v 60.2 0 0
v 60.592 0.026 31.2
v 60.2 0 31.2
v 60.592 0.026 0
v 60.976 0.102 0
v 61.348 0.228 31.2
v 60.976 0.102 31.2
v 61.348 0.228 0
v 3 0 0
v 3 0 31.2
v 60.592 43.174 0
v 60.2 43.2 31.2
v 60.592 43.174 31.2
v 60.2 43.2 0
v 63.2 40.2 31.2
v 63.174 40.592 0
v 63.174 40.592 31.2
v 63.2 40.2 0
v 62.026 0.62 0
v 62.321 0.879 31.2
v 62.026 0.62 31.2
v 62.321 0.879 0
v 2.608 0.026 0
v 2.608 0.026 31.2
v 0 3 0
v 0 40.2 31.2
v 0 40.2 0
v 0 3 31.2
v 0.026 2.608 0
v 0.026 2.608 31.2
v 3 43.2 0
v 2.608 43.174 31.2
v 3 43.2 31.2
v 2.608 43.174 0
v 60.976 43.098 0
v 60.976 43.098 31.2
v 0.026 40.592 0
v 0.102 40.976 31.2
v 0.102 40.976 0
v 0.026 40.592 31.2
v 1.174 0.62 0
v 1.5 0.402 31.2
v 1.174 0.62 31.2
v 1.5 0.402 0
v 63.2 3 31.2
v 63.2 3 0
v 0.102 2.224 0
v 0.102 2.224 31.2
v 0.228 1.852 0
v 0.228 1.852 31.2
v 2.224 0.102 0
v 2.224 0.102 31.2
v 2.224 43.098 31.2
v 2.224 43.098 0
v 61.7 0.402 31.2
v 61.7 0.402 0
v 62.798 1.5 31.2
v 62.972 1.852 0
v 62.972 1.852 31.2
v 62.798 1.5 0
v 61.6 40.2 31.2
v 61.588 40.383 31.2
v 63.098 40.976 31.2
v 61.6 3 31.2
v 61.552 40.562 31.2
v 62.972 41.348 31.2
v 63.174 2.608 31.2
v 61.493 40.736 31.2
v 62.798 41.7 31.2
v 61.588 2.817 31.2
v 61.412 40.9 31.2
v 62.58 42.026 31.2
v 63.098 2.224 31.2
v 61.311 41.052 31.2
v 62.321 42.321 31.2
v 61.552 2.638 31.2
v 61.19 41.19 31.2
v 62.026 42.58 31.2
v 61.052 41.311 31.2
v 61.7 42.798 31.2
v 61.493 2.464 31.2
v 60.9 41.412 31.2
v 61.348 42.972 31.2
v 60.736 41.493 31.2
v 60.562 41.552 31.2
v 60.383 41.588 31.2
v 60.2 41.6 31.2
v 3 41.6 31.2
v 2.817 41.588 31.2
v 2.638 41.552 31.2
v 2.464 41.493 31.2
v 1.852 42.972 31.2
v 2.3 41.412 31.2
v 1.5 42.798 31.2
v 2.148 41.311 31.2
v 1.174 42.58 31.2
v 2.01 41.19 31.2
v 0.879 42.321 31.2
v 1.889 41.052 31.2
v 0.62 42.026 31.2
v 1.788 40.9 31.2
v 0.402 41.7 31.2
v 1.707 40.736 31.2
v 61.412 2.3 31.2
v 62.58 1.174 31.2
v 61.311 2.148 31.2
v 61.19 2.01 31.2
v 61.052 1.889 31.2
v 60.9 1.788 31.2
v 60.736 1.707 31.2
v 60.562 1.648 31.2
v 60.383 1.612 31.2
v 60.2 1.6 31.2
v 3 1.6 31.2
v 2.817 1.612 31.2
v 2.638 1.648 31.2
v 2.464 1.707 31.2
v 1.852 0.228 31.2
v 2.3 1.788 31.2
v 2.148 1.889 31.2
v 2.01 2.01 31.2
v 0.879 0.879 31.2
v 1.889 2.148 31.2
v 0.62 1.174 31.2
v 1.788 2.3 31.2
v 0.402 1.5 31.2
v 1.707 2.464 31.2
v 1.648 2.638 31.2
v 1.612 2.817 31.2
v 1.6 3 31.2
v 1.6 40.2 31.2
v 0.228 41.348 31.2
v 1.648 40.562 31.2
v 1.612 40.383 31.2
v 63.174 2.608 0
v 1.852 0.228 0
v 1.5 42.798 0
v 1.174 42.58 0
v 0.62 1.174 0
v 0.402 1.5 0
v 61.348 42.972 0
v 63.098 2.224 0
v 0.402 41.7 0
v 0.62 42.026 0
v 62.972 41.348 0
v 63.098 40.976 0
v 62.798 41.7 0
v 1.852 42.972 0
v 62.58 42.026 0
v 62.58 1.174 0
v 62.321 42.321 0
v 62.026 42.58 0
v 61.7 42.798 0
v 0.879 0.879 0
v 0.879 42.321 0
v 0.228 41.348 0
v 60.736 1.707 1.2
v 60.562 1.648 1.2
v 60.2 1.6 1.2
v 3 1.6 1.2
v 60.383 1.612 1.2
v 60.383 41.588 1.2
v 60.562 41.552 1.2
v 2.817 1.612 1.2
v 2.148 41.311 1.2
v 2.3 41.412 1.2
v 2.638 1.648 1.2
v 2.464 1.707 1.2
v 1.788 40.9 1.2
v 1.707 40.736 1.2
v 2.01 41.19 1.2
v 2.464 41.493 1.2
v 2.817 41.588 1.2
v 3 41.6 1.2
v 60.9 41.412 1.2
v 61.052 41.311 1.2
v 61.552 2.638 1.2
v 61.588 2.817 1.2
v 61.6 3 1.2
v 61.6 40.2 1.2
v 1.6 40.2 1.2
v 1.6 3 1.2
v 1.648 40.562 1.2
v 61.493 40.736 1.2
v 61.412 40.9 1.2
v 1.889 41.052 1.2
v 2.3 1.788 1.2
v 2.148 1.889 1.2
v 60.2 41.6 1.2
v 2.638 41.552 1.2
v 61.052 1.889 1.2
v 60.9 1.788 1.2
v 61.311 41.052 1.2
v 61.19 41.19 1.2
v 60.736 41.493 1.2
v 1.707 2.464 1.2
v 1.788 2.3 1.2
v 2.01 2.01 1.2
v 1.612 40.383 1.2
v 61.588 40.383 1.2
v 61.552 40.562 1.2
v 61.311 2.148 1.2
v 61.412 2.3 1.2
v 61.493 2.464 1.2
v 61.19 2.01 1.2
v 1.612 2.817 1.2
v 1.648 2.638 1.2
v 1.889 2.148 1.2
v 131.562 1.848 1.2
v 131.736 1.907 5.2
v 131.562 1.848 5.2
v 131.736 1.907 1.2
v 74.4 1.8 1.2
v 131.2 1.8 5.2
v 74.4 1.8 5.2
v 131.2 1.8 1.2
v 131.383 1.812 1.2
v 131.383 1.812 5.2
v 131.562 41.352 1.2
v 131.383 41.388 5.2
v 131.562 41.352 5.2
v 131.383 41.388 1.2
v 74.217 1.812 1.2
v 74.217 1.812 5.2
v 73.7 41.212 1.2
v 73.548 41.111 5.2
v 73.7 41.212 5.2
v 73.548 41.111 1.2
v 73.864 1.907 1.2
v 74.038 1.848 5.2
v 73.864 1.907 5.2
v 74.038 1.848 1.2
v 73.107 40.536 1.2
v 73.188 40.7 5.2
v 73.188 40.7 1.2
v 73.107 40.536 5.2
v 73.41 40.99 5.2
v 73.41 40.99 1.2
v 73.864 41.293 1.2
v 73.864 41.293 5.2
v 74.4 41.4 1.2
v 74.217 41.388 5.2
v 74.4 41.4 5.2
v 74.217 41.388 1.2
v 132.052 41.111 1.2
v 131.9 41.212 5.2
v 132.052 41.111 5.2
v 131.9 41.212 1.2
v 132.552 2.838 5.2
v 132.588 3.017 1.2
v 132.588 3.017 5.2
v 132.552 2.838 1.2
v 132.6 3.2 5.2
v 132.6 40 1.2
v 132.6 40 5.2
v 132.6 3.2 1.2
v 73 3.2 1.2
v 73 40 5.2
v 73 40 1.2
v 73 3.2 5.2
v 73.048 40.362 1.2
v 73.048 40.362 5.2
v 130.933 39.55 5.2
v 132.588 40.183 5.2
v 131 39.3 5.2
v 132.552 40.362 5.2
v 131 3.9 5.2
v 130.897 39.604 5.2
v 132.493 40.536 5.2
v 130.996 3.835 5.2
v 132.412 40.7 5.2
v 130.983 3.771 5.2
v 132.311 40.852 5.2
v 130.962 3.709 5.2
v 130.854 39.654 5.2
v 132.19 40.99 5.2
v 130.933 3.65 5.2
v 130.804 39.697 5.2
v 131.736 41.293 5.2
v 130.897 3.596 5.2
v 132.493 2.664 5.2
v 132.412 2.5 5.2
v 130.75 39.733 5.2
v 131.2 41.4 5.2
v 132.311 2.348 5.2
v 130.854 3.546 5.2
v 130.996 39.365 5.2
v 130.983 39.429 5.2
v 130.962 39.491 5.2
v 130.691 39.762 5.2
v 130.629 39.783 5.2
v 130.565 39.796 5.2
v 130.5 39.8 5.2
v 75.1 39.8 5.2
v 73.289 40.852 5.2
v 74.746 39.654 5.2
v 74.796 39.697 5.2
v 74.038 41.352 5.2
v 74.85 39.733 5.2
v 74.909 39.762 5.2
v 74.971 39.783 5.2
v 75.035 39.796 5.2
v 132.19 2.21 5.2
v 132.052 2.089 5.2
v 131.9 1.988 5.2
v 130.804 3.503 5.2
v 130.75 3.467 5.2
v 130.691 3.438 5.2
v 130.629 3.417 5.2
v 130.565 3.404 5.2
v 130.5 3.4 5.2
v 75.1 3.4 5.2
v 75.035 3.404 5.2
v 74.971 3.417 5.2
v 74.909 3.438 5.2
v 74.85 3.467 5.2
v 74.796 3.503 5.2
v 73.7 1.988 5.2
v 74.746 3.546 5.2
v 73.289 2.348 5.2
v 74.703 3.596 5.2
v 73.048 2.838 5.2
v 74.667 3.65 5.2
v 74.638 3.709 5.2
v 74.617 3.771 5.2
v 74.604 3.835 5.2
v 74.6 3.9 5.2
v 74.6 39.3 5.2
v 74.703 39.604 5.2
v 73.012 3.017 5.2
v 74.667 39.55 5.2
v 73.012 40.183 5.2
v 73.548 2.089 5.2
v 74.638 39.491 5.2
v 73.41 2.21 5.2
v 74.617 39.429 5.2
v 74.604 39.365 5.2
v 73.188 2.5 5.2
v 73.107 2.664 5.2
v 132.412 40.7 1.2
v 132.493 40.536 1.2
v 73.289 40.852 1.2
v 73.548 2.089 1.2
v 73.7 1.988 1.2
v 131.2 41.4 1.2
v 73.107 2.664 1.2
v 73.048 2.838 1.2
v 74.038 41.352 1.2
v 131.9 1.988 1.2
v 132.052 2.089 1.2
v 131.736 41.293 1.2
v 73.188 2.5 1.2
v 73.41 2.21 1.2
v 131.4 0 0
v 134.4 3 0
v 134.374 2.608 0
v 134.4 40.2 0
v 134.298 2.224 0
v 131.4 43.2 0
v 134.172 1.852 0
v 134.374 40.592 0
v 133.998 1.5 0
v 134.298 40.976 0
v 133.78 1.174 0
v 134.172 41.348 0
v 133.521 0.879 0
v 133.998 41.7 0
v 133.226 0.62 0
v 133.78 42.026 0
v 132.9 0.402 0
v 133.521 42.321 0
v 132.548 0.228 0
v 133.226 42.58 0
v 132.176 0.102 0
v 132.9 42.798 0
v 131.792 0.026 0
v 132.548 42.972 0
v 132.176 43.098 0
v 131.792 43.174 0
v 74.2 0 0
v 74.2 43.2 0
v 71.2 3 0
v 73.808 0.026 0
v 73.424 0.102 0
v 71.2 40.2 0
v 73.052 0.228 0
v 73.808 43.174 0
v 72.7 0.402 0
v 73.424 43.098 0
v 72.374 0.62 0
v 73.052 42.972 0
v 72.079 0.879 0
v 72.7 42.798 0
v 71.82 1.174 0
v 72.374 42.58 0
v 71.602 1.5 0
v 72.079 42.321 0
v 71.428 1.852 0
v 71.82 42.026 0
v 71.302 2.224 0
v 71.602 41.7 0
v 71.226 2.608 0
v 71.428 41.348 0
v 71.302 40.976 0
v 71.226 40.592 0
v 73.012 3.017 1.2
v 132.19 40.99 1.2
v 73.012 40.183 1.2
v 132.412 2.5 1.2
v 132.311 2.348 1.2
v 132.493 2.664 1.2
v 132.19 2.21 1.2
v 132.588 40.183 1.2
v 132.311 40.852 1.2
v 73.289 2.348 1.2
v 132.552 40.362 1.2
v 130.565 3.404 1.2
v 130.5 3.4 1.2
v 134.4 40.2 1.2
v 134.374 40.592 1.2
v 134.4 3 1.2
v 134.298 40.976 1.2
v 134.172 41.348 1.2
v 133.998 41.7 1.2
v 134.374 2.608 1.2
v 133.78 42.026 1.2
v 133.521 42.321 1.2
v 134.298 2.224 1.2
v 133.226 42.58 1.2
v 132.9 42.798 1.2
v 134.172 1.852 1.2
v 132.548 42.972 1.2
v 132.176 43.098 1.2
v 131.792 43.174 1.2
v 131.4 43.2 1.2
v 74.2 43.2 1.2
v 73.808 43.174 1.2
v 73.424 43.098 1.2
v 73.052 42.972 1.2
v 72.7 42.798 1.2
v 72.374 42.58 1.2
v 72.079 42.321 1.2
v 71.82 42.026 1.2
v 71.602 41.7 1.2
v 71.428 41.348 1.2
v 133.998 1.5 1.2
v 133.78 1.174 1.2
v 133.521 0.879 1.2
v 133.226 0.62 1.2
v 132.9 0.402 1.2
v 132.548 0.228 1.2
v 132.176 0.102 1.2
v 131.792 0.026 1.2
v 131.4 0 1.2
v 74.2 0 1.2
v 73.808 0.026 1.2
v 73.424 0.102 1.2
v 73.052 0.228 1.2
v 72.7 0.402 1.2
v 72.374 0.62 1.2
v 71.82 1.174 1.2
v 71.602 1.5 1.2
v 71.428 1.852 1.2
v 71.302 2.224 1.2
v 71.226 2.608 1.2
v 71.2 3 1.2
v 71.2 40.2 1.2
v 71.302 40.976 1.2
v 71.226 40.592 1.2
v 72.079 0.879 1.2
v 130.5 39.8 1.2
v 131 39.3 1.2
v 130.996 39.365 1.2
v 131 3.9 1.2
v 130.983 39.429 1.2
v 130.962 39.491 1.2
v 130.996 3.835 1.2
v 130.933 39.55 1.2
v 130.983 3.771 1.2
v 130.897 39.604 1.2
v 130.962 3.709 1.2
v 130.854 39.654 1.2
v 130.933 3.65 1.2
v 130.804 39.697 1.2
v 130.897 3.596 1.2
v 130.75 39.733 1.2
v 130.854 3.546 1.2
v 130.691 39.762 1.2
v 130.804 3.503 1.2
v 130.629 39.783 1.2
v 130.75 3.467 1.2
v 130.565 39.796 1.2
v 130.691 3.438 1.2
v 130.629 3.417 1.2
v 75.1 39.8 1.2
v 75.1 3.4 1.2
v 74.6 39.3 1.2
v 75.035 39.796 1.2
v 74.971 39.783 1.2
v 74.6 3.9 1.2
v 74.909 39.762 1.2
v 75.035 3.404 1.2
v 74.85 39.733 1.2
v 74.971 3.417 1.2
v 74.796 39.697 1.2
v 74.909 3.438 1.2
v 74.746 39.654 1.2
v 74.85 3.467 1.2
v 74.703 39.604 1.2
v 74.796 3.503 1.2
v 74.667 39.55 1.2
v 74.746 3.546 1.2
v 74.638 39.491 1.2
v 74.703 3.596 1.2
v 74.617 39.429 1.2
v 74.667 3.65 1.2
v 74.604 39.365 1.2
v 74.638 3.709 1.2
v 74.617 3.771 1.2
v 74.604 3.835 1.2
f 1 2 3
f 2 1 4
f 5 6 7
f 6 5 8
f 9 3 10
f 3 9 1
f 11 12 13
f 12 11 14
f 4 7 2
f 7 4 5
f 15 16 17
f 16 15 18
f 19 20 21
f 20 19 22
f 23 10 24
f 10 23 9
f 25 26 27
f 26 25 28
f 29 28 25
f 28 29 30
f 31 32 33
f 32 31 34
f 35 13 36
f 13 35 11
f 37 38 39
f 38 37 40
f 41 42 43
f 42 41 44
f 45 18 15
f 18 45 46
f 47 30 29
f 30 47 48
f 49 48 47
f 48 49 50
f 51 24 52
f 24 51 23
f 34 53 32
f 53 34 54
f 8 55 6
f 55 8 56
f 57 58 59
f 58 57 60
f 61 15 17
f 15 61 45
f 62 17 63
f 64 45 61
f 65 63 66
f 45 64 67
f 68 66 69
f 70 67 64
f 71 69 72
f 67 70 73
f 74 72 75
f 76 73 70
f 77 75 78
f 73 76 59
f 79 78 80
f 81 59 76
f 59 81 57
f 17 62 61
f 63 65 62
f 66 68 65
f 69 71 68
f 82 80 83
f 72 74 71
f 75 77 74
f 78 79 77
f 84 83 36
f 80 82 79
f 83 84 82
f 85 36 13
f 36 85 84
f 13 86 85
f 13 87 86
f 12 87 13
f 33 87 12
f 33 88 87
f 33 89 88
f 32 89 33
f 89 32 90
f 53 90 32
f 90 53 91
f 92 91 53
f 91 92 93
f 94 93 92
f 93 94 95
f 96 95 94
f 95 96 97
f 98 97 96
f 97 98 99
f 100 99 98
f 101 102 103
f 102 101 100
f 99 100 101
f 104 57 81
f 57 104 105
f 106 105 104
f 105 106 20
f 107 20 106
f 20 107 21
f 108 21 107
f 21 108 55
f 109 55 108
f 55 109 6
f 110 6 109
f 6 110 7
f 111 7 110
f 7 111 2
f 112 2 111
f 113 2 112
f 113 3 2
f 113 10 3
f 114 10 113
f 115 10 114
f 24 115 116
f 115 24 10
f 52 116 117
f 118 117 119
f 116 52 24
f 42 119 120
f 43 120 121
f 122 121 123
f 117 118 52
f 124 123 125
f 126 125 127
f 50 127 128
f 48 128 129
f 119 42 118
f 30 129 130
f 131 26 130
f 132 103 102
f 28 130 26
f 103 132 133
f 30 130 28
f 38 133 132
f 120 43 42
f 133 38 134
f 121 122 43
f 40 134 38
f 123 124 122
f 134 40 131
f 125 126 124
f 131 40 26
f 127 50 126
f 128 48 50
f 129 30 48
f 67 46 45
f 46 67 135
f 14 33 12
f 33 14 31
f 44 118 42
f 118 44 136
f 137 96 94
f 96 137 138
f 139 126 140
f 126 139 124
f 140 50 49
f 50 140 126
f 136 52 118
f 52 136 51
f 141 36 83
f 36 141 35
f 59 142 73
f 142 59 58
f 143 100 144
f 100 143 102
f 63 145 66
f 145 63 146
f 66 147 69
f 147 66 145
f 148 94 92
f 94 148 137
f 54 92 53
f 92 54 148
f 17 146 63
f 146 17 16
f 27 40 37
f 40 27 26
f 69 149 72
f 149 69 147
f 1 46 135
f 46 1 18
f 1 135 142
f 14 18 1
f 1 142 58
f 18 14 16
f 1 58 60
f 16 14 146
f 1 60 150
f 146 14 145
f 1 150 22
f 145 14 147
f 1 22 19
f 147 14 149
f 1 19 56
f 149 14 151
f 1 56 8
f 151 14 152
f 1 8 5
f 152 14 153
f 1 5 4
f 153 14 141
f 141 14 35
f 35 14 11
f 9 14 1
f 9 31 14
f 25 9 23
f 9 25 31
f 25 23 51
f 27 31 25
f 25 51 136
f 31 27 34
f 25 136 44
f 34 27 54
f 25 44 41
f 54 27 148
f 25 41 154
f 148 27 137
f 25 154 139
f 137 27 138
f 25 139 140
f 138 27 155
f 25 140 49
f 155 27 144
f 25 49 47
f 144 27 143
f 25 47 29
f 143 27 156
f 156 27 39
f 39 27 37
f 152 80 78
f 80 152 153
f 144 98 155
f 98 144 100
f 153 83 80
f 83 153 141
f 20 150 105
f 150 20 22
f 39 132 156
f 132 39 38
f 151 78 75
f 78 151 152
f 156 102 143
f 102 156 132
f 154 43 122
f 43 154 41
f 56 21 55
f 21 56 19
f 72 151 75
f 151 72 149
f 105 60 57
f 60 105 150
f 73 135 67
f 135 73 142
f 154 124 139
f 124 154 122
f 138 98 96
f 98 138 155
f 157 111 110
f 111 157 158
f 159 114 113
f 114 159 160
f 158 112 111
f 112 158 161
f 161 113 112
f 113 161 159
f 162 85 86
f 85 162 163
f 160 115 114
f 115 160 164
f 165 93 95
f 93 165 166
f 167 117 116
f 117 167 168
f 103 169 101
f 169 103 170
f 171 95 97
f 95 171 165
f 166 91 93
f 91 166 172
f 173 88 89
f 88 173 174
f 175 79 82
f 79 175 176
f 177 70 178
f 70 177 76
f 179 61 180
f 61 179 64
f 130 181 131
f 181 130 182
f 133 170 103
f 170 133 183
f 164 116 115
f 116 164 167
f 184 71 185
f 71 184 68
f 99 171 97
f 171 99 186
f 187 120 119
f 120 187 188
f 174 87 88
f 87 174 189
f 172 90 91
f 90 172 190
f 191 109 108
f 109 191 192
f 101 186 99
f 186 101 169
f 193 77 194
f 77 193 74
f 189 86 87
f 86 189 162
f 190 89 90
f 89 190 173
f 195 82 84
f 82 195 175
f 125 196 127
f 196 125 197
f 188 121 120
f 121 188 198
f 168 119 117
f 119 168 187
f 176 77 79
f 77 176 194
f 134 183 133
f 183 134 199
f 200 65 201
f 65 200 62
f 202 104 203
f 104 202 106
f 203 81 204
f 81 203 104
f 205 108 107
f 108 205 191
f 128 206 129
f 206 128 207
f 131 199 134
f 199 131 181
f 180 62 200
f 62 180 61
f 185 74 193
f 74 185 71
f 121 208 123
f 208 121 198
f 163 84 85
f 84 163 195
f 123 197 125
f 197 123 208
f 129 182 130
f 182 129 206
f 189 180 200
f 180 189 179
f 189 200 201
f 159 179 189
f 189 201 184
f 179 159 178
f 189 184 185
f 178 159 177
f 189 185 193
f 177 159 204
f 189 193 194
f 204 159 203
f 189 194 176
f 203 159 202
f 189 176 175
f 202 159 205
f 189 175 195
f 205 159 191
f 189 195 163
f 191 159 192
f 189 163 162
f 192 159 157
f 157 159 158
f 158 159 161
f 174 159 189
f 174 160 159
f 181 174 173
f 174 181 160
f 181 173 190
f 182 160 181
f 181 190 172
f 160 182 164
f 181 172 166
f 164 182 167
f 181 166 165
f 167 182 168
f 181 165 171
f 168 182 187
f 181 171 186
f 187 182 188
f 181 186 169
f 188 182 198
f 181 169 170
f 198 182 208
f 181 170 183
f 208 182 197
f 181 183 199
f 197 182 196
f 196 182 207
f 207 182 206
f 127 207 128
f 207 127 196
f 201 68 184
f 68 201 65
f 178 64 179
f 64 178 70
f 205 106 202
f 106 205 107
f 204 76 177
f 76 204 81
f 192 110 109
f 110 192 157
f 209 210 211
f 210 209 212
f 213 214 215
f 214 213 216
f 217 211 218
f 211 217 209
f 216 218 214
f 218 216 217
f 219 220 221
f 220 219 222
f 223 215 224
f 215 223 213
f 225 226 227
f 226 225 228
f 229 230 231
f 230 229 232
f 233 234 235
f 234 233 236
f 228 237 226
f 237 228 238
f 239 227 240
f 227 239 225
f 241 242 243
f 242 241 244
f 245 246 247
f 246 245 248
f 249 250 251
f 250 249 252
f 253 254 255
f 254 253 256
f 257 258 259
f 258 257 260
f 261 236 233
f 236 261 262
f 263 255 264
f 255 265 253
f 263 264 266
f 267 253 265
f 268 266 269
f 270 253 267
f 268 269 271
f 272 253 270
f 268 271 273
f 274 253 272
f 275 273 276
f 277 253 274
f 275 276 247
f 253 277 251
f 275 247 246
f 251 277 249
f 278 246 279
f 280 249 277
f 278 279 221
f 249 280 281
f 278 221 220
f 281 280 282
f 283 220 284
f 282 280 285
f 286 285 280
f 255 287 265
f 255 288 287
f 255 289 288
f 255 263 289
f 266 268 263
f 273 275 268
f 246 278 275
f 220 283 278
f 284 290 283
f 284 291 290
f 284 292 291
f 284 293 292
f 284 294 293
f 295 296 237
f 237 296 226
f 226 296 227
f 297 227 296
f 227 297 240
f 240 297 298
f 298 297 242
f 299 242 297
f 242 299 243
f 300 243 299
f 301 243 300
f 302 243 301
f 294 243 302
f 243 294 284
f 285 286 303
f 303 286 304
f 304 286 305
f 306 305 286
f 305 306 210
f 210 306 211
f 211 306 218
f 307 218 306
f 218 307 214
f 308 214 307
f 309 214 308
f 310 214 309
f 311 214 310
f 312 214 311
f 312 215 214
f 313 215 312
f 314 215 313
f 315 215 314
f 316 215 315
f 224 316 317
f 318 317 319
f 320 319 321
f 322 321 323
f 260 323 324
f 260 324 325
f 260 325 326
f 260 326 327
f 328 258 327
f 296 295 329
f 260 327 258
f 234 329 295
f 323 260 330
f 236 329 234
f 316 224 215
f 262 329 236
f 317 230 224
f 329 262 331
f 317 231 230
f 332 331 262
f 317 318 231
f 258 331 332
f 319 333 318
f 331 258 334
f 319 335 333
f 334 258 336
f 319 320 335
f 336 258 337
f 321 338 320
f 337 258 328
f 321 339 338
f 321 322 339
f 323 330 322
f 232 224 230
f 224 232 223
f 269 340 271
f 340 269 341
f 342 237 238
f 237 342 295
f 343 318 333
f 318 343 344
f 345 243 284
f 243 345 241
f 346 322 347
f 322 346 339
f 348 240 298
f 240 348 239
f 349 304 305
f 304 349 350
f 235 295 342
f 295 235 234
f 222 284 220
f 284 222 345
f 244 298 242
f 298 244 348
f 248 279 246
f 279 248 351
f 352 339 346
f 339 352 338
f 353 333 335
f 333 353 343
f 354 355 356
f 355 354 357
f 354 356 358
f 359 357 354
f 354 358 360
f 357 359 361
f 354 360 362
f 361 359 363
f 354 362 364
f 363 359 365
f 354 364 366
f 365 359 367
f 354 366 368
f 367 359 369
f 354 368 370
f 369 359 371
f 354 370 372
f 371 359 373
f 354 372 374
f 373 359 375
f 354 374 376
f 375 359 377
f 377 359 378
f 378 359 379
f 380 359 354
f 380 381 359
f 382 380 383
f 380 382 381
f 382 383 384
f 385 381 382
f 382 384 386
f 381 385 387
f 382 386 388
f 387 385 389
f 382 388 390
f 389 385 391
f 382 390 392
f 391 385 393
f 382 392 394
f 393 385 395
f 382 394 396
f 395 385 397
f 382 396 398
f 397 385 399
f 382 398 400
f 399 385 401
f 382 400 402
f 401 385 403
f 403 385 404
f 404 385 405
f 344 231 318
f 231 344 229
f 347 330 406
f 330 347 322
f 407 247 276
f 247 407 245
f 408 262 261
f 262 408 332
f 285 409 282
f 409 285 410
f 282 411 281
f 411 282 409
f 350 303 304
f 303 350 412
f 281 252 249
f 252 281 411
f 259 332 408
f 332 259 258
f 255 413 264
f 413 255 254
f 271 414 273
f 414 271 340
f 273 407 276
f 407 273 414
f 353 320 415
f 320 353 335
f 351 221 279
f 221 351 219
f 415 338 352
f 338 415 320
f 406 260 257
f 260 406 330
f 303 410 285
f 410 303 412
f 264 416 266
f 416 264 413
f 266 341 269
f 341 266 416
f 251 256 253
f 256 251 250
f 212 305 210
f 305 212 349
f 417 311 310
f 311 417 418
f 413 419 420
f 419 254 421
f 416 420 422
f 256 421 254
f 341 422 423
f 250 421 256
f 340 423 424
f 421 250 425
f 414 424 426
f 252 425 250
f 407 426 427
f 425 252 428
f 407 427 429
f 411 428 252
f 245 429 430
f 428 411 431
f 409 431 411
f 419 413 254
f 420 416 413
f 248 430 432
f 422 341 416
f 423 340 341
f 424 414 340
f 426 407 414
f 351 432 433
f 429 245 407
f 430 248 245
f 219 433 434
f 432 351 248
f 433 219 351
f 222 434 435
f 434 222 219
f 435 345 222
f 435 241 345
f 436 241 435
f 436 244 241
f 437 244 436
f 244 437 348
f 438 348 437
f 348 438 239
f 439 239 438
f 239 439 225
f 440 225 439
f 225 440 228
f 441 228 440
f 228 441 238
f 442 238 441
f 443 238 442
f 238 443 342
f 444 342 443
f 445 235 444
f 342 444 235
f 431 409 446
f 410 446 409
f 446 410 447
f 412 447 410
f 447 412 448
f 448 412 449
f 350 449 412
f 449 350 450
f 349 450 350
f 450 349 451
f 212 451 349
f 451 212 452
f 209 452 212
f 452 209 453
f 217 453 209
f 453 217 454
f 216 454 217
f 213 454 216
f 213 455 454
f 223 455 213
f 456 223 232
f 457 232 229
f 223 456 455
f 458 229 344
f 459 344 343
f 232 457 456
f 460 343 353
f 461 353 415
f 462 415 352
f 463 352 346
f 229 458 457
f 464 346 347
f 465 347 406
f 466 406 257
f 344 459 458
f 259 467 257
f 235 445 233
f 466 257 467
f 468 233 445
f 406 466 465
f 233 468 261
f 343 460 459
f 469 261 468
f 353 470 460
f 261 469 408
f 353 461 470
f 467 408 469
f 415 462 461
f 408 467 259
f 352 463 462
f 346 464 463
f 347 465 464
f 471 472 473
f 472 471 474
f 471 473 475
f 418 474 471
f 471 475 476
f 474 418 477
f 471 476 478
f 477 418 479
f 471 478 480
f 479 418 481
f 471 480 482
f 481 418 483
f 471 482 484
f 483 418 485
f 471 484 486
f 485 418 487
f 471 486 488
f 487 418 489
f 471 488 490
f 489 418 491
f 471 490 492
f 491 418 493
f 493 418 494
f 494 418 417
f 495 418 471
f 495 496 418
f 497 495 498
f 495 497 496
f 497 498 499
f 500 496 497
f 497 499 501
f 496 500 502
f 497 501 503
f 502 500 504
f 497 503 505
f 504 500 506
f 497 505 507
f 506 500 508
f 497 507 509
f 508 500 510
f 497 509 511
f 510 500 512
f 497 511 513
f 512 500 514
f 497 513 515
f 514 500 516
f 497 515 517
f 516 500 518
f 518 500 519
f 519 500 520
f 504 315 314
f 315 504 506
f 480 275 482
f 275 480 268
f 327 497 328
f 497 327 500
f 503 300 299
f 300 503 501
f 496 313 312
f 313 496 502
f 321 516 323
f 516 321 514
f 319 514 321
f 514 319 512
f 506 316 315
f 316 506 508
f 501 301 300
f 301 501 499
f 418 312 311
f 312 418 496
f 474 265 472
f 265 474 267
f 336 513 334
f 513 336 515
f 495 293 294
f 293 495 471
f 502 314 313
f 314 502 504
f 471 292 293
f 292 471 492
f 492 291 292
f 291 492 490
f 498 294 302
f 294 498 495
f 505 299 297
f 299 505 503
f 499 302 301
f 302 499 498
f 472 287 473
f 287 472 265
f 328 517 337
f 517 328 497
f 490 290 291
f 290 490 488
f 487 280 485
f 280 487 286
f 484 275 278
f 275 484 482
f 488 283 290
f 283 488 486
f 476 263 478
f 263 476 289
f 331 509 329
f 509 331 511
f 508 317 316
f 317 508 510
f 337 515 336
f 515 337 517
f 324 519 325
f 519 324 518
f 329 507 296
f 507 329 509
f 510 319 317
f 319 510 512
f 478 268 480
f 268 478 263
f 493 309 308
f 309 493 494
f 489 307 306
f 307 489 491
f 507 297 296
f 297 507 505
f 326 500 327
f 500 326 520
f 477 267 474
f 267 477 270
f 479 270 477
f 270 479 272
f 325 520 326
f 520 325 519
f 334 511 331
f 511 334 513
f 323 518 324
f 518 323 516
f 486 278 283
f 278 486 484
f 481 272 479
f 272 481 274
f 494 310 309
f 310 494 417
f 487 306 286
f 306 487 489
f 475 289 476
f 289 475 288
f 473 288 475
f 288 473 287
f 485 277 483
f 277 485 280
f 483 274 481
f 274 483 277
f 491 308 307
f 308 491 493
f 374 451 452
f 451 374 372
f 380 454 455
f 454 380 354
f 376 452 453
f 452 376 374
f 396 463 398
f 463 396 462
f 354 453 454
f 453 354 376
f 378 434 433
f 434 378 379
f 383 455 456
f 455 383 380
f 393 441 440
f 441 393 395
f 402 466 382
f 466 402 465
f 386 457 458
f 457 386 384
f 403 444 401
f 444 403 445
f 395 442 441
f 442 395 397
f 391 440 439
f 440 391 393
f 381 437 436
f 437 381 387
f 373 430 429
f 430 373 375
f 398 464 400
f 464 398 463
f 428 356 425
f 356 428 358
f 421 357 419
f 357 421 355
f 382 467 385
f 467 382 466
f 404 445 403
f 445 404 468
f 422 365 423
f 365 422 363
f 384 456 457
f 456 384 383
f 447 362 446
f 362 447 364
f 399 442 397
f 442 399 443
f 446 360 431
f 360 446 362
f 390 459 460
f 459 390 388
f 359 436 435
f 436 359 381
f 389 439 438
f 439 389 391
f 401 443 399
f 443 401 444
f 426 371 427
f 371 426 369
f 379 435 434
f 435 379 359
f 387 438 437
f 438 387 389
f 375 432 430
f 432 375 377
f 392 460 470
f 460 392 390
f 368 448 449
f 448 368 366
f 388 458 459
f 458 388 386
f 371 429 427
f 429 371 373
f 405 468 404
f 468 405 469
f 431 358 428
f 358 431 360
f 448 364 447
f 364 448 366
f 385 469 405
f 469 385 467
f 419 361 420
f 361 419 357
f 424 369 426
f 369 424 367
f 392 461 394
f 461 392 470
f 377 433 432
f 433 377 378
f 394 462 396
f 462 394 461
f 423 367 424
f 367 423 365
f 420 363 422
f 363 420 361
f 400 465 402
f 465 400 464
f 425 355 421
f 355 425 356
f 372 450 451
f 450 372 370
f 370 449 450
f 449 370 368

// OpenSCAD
// Box with slip-fit lid. part = "box" | "lid" | "all" (lid printed upside down, next to box)
inner = [60, 40, 30];   // usable inside size X,Y,Z
wall = 1.6;             // 4 perimeters @0.4
floor = 1.2;
r = 3;                  // corner radius
lid_h = 8; lid_lip = 4; clearance = 0.2;  // 0.2 = snug slip fit on A1 mini
part = "all";
$fn = 48;
module rbox(s, rr) { linear_extrude(s[2]) offset(r = rr) offset(delta = -rr) square([s[0], s[1]]); }
outer = [inner[0] + 2 * wall, inner[1] + 2 * wall, inner[2] + floor];
module box() { difference() { rbox(outer, r); translate([wall, wall, floor]) rbox([inner[0], inner[1], inner[2] + 1], max(r - wall, 0.5)); } }
module lid() {
  rbox([outer[0], outer[1], floor], r);
  translate([wall + clearance, wall + clearance, 0]) difference() {
    rbox([inner[0] - 2 * clearance, inner[1] - 2 * clearance, floor + lid_lip], max(r - wall, 0.5));
    translate([wall, wall, floor]) rbox([inner[0] - 2 * clearance - 2 * wall, inner[1] - 2 * clearance - 2 * wall, lid_lip + 1], 0.5);
  }
}
if (part == "box" || part == "all") box();
if (part == "lid" || part == "all") translate([outer[0] + 8, 0, 0]) lid();
